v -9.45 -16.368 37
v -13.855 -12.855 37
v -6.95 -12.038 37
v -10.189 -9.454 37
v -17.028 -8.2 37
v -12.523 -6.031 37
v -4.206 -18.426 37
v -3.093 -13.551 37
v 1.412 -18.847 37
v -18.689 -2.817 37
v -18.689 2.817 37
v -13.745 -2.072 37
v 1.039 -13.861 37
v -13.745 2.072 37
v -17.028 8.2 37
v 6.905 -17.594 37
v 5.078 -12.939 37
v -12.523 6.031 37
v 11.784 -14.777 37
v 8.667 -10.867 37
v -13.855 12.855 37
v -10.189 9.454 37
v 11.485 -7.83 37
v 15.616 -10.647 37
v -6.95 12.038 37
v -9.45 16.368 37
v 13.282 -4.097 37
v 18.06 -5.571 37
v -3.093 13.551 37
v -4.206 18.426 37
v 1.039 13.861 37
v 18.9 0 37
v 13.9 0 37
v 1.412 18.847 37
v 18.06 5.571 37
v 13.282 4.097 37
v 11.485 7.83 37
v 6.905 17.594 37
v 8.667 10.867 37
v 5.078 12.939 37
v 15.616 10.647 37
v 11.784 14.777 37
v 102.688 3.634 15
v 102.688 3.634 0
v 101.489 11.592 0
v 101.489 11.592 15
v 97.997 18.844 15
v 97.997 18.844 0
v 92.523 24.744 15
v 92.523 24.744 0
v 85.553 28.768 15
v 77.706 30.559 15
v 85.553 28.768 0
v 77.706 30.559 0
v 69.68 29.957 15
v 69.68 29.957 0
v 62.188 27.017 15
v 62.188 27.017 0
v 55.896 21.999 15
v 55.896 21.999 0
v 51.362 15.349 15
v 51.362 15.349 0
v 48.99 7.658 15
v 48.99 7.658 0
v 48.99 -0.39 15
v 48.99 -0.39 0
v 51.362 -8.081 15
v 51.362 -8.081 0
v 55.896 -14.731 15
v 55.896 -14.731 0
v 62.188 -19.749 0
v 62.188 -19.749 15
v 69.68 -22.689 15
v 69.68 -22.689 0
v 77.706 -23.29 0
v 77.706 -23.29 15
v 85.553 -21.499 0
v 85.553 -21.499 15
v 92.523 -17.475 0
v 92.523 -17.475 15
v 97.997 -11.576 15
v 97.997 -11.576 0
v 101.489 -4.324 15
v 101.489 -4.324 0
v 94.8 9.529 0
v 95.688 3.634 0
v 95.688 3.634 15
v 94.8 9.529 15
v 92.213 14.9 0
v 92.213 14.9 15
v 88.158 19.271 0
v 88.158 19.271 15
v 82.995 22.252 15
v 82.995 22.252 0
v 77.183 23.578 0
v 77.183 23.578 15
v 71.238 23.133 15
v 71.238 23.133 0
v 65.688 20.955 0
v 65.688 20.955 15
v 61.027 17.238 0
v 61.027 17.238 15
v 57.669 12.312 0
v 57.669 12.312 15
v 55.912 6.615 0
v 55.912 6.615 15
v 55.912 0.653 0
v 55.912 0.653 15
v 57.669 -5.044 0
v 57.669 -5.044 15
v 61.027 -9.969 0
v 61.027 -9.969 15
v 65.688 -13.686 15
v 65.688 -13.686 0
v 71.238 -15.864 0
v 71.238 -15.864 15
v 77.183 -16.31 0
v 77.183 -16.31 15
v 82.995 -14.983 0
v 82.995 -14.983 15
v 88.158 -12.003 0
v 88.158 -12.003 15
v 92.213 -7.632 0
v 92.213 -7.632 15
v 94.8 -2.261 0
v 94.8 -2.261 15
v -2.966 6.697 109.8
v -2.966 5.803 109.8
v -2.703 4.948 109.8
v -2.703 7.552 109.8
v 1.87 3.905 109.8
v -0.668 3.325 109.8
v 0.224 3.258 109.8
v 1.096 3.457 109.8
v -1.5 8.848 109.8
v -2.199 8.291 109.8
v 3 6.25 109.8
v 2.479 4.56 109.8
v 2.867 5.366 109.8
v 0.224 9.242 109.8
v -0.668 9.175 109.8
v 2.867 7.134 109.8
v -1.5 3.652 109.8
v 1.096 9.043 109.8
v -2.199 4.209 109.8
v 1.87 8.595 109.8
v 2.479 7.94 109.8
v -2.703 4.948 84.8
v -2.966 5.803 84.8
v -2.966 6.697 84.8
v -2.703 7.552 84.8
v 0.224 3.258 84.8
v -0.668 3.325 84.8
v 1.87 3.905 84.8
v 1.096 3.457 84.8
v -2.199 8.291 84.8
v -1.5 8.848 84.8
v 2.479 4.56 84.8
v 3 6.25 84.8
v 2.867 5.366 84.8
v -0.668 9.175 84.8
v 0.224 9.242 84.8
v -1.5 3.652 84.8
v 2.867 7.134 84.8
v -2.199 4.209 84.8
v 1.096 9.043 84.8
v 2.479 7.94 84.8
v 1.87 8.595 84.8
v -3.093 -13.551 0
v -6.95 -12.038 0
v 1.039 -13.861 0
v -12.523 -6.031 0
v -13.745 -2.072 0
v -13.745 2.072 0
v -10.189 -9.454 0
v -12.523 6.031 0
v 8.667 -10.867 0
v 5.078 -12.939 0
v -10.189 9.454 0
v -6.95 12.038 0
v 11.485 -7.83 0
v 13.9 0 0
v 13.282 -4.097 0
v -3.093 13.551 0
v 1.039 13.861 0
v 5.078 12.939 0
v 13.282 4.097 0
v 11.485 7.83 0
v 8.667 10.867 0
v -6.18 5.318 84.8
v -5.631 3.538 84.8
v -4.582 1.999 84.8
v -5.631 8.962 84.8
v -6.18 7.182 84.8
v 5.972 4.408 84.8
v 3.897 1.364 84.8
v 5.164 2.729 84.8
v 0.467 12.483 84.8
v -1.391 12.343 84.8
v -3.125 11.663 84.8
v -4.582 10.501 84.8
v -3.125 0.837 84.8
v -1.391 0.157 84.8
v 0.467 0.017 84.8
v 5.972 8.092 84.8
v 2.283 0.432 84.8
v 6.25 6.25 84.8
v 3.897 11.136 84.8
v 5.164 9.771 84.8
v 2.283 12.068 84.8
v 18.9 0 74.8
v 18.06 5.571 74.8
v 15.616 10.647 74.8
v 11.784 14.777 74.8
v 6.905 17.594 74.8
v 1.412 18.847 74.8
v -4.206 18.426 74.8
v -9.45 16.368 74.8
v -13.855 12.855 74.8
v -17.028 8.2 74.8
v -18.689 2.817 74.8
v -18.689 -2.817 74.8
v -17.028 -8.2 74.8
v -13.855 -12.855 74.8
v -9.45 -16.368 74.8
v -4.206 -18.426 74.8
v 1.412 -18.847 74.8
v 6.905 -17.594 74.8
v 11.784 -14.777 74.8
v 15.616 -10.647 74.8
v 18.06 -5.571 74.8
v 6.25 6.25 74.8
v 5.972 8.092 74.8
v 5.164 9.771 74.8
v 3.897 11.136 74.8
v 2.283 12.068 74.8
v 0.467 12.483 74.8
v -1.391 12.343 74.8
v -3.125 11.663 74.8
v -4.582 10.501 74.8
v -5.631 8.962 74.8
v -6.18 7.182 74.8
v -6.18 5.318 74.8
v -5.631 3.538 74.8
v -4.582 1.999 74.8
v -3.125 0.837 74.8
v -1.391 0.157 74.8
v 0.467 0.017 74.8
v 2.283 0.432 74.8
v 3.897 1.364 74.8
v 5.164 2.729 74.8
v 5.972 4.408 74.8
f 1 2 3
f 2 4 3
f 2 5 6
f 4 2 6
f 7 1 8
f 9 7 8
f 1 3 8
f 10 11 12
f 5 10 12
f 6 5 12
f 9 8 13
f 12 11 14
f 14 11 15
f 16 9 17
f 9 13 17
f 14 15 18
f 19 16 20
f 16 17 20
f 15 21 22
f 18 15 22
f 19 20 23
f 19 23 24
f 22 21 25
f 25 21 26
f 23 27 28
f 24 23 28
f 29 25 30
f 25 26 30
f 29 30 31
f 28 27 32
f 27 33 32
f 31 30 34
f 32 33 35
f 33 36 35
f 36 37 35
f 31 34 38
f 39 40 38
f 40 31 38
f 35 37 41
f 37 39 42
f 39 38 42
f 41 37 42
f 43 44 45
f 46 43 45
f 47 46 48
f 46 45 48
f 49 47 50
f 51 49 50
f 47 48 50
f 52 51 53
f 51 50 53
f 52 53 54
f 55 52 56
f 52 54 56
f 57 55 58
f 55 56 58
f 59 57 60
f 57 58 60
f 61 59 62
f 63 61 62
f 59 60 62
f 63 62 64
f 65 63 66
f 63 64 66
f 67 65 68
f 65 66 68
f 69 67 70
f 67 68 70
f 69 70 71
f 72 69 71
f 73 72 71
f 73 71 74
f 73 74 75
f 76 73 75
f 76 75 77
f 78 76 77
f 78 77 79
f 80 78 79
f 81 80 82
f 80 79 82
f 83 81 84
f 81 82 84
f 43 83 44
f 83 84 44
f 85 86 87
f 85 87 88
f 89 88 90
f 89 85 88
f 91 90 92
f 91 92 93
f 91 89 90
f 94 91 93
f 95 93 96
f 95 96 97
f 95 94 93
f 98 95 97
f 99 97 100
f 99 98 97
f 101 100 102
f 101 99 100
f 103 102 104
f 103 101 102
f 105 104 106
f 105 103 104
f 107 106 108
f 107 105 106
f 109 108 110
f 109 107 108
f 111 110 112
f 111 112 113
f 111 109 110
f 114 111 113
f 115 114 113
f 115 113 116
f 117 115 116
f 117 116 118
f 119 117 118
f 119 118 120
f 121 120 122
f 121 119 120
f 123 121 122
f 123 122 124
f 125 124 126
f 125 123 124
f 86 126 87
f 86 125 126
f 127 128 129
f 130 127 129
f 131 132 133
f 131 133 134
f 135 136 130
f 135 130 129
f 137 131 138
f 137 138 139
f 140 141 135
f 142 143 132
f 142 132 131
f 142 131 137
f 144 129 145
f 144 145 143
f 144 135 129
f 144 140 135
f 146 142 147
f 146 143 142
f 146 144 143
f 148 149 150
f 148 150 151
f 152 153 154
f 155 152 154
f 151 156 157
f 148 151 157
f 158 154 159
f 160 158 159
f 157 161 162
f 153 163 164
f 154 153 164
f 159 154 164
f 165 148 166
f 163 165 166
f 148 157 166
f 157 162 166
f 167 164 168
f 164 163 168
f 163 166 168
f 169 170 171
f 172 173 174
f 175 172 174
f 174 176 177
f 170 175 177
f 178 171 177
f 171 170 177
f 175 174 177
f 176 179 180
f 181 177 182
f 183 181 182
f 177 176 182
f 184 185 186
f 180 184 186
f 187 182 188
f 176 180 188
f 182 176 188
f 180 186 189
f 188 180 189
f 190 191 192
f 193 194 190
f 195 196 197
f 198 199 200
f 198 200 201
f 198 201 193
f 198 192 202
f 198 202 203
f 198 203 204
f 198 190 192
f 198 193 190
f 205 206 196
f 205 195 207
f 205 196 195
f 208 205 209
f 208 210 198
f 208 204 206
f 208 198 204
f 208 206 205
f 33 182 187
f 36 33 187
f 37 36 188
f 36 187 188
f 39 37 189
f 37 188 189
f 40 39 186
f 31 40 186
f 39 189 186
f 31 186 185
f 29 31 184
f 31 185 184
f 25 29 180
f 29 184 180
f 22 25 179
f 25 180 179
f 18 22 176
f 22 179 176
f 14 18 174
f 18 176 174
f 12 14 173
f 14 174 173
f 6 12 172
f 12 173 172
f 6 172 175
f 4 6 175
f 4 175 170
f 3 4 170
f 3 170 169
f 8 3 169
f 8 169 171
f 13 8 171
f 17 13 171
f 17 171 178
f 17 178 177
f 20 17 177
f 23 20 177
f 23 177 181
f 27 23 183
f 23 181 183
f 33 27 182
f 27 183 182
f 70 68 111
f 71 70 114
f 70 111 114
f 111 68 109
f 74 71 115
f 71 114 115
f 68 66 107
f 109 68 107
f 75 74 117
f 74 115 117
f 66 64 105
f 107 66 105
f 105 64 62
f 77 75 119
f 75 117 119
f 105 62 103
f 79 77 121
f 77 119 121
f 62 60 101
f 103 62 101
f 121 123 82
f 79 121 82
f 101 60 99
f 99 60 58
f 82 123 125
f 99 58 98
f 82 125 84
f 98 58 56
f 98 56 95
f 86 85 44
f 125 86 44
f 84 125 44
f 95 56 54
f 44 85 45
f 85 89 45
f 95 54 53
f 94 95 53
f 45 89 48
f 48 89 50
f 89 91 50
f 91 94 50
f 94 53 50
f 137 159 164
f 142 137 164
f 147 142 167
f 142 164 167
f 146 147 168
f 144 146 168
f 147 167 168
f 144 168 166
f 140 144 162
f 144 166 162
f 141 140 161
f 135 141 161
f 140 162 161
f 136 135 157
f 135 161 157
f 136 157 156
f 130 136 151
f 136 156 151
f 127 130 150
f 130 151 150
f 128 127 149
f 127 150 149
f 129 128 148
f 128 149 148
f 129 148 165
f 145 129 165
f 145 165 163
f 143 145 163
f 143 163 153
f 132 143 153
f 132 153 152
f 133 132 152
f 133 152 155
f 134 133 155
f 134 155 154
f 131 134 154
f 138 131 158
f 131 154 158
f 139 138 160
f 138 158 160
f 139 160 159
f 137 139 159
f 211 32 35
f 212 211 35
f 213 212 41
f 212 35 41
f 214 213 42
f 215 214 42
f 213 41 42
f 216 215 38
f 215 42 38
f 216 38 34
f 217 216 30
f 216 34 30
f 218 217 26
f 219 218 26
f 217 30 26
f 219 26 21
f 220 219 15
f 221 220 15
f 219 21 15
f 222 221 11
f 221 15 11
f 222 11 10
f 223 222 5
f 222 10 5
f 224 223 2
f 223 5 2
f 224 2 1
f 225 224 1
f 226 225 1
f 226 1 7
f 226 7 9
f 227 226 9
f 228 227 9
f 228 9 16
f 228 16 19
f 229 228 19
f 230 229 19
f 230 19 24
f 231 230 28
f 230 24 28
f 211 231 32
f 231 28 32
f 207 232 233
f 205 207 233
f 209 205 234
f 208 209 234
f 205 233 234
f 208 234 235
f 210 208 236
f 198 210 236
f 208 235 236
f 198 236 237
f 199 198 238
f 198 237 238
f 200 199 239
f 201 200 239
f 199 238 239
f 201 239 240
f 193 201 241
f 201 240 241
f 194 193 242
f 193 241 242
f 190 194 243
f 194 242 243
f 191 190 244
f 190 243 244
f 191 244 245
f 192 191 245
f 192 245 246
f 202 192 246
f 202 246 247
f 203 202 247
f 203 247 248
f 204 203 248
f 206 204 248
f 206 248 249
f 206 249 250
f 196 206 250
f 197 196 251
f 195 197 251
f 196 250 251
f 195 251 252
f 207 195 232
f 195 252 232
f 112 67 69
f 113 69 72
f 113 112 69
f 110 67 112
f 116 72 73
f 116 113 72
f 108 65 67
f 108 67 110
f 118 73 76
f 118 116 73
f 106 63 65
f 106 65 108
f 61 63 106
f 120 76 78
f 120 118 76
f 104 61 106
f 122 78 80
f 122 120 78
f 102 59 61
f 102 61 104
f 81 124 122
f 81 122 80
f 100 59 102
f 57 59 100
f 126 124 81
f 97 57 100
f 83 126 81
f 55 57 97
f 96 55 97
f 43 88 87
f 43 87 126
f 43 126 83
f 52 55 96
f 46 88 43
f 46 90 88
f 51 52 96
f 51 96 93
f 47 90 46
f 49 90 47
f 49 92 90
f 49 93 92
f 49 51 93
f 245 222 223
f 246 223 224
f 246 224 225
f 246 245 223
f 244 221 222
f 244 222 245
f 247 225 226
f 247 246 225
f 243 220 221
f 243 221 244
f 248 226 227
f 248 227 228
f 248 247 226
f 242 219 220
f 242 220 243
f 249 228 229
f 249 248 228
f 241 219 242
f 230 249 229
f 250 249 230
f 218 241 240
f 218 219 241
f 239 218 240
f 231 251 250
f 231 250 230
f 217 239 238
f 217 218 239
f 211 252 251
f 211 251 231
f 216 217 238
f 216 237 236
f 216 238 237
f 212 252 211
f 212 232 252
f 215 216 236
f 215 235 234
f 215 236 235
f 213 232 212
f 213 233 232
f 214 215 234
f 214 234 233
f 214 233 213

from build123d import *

# Parameters (mm, degrees)
F0_R     = 13.9
F1_DEPTH = 37
F2_R     = 18.9
F3_DEPTH = 37.8
F4_R     = 6.25
F5_DEPTH = 10
F6_R     = 3
F7_DEPTH = 25
F8_R     = 27
F8_R_2   = 20
F9_DEPTH = 15


with BuildPart() as f1:
    # F0 (on Top) → F1 (new body)
    with BuildSketch(Plane.XY):
        Circle(F0_R)
    extrude(amount=F1_DEPTH)

    # F2 (on face) → F3 (join)
    with BuildSketch(Plane.XY.offset(37)):
        Circle(F2_R)
    extrude(amount=F3_DEPTH)

    # F4 (on face) → F5 (join)
    with BuildSketch(Plane.XY.offset(74.8)):
        with Locations((0, 6.25)):
            Circle(F4_R)
    extrude(amount=F5_DEPTH)


with BuildPart() as f7:
    # F6 (on face) → F7 (new body)
    with BuildSketch(Plane.XY.offset(84.8)):
        with Locations((0, 6.25)):
            Circle(F6_R)
    extrude(amount=F7_DEPTH)


with BuildPart() as f9:
    # F8 (on Top) → F9 (new body)
    with BuildSketch(Plane.XY):
        with Locations((75.688303, 3.634093)):
            Circle(F8_R)
        with Locations((75.688303, 3.634093)):
            Circle(F8_R_2, mode=Mode.SUBTRACT)
    extrude(amount=F9_DEPTH)


solid = Compound([f1.part, f7.part, f9.part])
